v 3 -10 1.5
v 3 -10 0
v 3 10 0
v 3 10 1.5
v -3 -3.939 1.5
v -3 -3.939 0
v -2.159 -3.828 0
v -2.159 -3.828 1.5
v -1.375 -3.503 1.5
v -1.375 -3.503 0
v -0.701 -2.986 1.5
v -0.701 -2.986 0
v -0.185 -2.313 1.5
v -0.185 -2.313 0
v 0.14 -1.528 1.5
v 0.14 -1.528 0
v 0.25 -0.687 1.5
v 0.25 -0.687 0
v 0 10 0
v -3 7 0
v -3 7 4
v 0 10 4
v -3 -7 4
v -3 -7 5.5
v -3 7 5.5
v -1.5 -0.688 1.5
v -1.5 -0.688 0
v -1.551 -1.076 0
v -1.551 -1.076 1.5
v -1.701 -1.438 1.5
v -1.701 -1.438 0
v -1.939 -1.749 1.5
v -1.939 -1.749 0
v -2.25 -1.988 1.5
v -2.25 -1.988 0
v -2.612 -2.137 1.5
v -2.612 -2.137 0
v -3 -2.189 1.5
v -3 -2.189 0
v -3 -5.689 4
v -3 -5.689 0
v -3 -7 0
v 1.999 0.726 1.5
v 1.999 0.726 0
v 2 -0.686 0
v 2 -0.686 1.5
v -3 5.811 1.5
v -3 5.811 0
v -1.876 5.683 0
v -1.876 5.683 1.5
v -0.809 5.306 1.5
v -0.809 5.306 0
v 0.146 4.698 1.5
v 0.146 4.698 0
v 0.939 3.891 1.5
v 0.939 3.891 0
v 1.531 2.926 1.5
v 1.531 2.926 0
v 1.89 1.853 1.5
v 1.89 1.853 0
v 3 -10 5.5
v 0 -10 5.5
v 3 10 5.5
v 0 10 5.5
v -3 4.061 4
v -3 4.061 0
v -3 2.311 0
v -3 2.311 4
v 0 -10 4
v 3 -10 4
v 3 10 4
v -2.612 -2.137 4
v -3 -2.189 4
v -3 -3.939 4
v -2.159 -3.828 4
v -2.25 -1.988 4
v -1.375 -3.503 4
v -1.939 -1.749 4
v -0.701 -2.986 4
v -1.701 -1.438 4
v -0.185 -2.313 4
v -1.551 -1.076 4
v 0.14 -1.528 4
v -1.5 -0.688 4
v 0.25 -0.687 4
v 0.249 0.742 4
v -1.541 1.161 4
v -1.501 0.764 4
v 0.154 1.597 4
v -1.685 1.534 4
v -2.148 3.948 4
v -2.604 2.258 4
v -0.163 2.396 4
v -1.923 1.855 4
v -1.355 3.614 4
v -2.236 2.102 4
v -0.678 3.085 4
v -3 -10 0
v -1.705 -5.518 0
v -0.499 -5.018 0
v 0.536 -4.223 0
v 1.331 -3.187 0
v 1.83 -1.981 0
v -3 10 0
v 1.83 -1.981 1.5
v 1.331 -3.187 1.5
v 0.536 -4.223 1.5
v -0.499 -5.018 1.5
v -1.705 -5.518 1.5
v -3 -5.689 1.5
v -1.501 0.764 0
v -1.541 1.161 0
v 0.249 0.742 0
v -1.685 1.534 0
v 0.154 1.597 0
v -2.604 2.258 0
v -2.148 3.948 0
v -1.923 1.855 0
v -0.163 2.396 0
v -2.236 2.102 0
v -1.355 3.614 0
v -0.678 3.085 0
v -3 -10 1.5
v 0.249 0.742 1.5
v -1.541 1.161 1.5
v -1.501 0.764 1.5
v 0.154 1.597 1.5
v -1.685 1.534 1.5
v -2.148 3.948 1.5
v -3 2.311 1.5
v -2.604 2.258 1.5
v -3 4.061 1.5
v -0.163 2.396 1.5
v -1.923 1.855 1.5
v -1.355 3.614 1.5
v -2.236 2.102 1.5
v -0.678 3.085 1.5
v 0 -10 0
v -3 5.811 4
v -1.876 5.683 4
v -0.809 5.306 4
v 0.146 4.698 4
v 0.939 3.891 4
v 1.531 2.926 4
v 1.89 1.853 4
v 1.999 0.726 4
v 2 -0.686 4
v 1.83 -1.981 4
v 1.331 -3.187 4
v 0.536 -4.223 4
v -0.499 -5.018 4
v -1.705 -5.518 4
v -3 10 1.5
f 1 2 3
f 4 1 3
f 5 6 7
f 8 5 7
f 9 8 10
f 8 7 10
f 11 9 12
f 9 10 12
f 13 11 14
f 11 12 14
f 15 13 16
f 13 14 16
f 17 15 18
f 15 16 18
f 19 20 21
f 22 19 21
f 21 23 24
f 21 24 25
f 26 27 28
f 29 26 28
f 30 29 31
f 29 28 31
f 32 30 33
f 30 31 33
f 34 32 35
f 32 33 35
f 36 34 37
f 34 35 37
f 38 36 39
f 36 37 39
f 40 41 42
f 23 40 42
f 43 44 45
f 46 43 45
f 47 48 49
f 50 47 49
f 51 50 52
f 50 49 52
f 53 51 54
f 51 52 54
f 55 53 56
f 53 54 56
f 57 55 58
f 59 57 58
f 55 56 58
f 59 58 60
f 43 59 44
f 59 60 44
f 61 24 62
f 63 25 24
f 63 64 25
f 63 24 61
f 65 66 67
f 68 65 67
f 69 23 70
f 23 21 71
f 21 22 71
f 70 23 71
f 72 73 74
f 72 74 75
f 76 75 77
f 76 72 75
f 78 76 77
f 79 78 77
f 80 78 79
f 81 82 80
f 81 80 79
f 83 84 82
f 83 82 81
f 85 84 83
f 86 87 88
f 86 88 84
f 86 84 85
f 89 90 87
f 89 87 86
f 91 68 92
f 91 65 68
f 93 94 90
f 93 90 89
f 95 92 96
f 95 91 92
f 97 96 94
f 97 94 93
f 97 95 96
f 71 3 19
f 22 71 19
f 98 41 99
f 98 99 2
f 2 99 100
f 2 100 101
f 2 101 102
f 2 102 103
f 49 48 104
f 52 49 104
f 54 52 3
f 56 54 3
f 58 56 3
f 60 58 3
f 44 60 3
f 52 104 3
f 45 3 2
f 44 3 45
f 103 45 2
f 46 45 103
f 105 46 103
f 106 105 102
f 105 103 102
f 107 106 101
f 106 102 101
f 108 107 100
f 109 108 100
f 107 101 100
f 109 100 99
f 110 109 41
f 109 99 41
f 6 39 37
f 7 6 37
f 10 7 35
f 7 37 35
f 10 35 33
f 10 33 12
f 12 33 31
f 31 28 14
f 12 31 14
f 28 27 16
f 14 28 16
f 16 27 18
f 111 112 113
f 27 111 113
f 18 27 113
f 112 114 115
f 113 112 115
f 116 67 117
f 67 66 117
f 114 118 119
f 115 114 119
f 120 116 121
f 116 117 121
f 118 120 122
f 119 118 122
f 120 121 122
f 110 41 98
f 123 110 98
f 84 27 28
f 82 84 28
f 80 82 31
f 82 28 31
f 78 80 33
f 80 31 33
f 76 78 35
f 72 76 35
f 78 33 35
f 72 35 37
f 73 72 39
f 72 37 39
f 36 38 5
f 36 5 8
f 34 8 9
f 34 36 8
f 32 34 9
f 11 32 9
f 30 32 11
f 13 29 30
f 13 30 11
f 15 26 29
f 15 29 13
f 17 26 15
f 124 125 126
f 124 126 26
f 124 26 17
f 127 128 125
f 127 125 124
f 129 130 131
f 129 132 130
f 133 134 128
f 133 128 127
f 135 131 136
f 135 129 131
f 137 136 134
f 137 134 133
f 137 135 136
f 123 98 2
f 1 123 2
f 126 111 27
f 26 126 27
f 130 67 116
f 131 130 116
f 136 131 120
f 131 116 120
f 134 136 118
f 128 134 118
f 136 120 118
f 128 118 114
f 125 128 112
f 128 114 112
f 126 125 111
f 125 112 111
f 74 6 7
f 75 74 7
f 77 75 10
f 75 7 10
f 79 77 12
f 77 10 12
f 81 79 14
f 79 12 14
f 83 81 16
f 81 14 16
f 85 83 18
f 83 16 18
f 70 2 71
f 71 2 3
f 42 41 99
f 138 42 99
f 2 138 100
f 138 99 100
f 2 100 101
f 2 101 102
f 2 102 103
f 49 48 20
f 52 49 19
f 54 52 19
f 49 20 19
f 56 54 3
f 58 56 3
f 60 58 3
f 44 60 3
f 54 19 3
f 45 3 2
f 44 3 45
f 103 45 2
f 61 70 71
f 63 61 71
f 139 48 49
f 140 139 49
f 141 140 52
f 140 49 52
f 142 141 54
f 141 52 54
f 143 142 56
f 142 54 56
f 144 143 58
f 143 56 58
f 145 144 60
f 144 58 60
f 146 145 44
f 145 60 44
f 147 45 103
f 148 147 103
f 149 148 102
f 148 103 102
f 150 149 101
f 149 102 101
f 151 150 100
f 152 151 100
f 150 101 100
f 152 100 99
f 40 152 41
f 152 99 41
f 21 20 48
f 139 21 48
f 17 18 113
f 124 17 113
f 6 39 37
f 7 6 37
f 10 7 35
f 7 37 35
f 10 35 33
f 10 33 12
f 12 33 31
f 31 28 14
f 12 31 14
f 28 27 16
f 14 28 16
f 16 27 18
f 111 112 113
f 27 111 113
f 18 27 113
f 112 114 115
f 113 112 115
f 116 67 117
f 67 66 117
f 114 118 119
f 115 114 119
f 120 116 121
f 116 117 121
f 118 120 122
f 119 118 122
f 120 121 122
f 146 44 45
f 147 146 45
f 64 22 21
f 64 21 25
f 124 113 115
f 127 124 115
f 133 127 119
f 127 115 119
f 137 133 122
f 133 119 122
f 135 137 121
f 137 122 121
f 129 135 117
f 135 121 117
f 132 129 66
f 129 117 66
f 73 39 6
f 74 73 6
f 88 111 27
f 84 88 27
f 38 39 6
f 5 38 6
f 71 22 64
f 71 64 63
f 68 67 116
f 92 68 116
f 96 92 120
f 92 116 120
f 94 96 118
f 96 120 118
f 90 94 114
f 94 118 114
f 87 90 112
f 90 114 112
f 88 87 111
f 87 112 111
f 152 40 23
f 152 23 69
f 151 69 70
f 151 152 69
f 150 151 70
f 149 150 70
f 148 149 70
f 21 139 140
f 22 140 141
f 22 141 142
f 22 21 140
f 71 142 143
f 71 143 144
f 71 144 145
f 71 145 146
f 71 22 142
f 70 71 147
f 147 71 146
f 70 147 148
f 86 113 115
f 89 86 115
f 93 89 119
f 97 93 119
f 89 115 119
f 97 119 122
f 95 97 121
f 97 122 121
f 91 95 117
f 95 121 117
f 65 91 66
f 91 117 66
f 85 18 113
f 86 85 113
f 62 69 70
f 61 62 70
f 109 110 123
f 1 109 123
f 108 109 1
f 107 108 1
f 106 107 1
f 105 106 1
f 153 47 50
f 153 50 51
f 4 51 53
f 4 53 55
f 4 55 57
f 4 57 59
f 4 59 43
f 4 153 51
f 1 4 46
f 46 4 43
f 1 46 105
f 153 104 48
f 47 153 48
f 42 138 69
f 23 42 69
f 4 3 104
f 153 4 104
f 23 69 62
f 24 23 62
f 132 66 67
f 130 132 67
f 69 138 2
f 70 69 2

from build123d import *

# Parameters (mm, degrees)
F1_DEPTH  = 4
F3_W      = 6
F3_H      = 20
F4_DEPTH  = 1.5
F5_SIZE   = 3
F5_2_SIZE = 3


with BuildPart() as f1:
    # F0 (on Top) → F1 (new body)
    with BuildSketch(Plane.XY):
        with BuildLine():
            Line((3, -10), (3, 10))
            Line((3, 10), (-3, 10))
            Line((-3, 10), (-3, 5.8113613003))
            ThreePointArc((-3, 5.8113613003), (0.5654981212, 4.3166748595), (1.9992755637, 0.7262505595))
            Line((1.9992755637, 0.7262505595), (1.9999993434, -0.6860763339))
            ThreePointArc((1.9999993434, -0.6860763339), (0.536439723, -4.2232665564), (-3, -5.6886386997))
            Line((-3, -5.6886386997), (-3, -10))
            Line((-3, -10), (3, -10))
        make_face()
    extrude(amount=F1_DEPTH)

    # F5
    f5_edges = [f1.edges().sort_by_distance(p)[0] for p in [
        (-3, 10, 2),
        (-3, -10, 2),
    ]]
    chamfer(f5_edges, length=F5_SIZE)


with BuildPart() as f1b:
    # F0 (on Top) → F1, piece 2 (new body)
    with BuildSketch(Plane.XY):
        with BuildLine():
            ThreePointArc((-3, 2.3113613003), (-1.9227647543, 1.8551832321), (-1.5007442997, 0.7641136008))
            Line((-1.5007442997, 0.7641136008), (-1.500000197, -0.68786999))
            ThreePointArc((-1.500000197, -0.68786999), (-1.9390680831, -1.7490270567), (-3, -2.1886386997))
            Line((-3, -2.1886386997), (-3, -3.9386386997))
            ThreePointArc((-3, -3.9386386997), (-0.70131418, -2.9861468066), (0.2499995732, -0.6869731619))
            Line((0.2499995732, -0.6869731619), (0.2492670865, 0.7423439064))
            ThreePointArc((0.2492670865, 0.7423439064), (-0.6776298174, 3.084926064), (-3, 4.0613613003))
            Line((-3, 4.0613613003), (-3, 2.3113613003))
        make_face()
    extrude(amount=F1_DEPTH)


with BuildPart() as f4:
    # F3 (on face) → F4 (new body)
    with BuildSketch(Plane.XY.offset(4)):
        Rectangle(F3_W, F3_H)
    extrude(amount=F4_DEPTH)

    # F5#2
    f5_2_edges = [f4.edges().sort_by_distance(p)[0] for p in [
        (-3, 10, 4.75),
        (-3, -10, 4.75),
    ]]
    chamfer(f5_2_edges, length=F5_2_SIZE)


with BuildPart() as f4b:
    # F0 (on Top) → F4, piece 2 (new body)
    with BuildSketch(Plane.XY):
        with BuildLine():
            Line((3, -10), (3, 10))
            Line((3, 10), (-3, 10))
            Line((-3, 10), (-3, 5.8113613003))
            ThreePointArc((-3, 5.8113613003), (0.5654981212, 4.3166748595), (1.9992755637, 0.7262505595))
            Line((1.9992755637, 0.7262505595), (1.9999993434, -0.6860763339))
            ThreePointArc((1.9999993434, -0.6860763339), (0.536439723, -4.2232665564), (-3, -5.6886386997))
            Line((-3, -5.6886386997), (-3, -10))
            Line((-3, -10), (3, -10))
        make_face()
    extrude(amount=F4_DEPTH)


with BuildPart() as f4c:
    # F0 (on Top) → F4, piece 3 (new body)
    with BuildSketch(Plane.XY):
        with BuildLine():
            ThreePointArc((-3, 2.3113613003), (-1.9227647543, 1.8551832321), (-1.5007442997, 0.7641136008))
            Line((-1.5007442997, 0.7641136008), (-1.500000197, -0.68786999))
            ThreePointArc((-1.500000197, -0.68786999), (-1.9390680831, -1.7490270567), (-3, -2.1886386997))
            Line((-3, -2.1886386997), (-3, -3.9386386997))
            ThreePointArc((-3, -3.9386386997), (-0.70131418, -2.9861468066), (0.2499995732, -0.6869731619))
            Line((0.2499995732, -0.6869731619), (0.2492670865, 0.7423439064))
            ThreePointArc((0.2492670865, 0.7423439064), (-0.6776298174, 3.084926064), (-3, 4.0613613003))
            Line((-3, 4.0613613003), (-3, 2.3113613003))
        make_face()
    extrude(amount=F4_DEPTH)


solid = Compound([f1.part, f1b.part, f4.part, f4b.part, f4c.part])
